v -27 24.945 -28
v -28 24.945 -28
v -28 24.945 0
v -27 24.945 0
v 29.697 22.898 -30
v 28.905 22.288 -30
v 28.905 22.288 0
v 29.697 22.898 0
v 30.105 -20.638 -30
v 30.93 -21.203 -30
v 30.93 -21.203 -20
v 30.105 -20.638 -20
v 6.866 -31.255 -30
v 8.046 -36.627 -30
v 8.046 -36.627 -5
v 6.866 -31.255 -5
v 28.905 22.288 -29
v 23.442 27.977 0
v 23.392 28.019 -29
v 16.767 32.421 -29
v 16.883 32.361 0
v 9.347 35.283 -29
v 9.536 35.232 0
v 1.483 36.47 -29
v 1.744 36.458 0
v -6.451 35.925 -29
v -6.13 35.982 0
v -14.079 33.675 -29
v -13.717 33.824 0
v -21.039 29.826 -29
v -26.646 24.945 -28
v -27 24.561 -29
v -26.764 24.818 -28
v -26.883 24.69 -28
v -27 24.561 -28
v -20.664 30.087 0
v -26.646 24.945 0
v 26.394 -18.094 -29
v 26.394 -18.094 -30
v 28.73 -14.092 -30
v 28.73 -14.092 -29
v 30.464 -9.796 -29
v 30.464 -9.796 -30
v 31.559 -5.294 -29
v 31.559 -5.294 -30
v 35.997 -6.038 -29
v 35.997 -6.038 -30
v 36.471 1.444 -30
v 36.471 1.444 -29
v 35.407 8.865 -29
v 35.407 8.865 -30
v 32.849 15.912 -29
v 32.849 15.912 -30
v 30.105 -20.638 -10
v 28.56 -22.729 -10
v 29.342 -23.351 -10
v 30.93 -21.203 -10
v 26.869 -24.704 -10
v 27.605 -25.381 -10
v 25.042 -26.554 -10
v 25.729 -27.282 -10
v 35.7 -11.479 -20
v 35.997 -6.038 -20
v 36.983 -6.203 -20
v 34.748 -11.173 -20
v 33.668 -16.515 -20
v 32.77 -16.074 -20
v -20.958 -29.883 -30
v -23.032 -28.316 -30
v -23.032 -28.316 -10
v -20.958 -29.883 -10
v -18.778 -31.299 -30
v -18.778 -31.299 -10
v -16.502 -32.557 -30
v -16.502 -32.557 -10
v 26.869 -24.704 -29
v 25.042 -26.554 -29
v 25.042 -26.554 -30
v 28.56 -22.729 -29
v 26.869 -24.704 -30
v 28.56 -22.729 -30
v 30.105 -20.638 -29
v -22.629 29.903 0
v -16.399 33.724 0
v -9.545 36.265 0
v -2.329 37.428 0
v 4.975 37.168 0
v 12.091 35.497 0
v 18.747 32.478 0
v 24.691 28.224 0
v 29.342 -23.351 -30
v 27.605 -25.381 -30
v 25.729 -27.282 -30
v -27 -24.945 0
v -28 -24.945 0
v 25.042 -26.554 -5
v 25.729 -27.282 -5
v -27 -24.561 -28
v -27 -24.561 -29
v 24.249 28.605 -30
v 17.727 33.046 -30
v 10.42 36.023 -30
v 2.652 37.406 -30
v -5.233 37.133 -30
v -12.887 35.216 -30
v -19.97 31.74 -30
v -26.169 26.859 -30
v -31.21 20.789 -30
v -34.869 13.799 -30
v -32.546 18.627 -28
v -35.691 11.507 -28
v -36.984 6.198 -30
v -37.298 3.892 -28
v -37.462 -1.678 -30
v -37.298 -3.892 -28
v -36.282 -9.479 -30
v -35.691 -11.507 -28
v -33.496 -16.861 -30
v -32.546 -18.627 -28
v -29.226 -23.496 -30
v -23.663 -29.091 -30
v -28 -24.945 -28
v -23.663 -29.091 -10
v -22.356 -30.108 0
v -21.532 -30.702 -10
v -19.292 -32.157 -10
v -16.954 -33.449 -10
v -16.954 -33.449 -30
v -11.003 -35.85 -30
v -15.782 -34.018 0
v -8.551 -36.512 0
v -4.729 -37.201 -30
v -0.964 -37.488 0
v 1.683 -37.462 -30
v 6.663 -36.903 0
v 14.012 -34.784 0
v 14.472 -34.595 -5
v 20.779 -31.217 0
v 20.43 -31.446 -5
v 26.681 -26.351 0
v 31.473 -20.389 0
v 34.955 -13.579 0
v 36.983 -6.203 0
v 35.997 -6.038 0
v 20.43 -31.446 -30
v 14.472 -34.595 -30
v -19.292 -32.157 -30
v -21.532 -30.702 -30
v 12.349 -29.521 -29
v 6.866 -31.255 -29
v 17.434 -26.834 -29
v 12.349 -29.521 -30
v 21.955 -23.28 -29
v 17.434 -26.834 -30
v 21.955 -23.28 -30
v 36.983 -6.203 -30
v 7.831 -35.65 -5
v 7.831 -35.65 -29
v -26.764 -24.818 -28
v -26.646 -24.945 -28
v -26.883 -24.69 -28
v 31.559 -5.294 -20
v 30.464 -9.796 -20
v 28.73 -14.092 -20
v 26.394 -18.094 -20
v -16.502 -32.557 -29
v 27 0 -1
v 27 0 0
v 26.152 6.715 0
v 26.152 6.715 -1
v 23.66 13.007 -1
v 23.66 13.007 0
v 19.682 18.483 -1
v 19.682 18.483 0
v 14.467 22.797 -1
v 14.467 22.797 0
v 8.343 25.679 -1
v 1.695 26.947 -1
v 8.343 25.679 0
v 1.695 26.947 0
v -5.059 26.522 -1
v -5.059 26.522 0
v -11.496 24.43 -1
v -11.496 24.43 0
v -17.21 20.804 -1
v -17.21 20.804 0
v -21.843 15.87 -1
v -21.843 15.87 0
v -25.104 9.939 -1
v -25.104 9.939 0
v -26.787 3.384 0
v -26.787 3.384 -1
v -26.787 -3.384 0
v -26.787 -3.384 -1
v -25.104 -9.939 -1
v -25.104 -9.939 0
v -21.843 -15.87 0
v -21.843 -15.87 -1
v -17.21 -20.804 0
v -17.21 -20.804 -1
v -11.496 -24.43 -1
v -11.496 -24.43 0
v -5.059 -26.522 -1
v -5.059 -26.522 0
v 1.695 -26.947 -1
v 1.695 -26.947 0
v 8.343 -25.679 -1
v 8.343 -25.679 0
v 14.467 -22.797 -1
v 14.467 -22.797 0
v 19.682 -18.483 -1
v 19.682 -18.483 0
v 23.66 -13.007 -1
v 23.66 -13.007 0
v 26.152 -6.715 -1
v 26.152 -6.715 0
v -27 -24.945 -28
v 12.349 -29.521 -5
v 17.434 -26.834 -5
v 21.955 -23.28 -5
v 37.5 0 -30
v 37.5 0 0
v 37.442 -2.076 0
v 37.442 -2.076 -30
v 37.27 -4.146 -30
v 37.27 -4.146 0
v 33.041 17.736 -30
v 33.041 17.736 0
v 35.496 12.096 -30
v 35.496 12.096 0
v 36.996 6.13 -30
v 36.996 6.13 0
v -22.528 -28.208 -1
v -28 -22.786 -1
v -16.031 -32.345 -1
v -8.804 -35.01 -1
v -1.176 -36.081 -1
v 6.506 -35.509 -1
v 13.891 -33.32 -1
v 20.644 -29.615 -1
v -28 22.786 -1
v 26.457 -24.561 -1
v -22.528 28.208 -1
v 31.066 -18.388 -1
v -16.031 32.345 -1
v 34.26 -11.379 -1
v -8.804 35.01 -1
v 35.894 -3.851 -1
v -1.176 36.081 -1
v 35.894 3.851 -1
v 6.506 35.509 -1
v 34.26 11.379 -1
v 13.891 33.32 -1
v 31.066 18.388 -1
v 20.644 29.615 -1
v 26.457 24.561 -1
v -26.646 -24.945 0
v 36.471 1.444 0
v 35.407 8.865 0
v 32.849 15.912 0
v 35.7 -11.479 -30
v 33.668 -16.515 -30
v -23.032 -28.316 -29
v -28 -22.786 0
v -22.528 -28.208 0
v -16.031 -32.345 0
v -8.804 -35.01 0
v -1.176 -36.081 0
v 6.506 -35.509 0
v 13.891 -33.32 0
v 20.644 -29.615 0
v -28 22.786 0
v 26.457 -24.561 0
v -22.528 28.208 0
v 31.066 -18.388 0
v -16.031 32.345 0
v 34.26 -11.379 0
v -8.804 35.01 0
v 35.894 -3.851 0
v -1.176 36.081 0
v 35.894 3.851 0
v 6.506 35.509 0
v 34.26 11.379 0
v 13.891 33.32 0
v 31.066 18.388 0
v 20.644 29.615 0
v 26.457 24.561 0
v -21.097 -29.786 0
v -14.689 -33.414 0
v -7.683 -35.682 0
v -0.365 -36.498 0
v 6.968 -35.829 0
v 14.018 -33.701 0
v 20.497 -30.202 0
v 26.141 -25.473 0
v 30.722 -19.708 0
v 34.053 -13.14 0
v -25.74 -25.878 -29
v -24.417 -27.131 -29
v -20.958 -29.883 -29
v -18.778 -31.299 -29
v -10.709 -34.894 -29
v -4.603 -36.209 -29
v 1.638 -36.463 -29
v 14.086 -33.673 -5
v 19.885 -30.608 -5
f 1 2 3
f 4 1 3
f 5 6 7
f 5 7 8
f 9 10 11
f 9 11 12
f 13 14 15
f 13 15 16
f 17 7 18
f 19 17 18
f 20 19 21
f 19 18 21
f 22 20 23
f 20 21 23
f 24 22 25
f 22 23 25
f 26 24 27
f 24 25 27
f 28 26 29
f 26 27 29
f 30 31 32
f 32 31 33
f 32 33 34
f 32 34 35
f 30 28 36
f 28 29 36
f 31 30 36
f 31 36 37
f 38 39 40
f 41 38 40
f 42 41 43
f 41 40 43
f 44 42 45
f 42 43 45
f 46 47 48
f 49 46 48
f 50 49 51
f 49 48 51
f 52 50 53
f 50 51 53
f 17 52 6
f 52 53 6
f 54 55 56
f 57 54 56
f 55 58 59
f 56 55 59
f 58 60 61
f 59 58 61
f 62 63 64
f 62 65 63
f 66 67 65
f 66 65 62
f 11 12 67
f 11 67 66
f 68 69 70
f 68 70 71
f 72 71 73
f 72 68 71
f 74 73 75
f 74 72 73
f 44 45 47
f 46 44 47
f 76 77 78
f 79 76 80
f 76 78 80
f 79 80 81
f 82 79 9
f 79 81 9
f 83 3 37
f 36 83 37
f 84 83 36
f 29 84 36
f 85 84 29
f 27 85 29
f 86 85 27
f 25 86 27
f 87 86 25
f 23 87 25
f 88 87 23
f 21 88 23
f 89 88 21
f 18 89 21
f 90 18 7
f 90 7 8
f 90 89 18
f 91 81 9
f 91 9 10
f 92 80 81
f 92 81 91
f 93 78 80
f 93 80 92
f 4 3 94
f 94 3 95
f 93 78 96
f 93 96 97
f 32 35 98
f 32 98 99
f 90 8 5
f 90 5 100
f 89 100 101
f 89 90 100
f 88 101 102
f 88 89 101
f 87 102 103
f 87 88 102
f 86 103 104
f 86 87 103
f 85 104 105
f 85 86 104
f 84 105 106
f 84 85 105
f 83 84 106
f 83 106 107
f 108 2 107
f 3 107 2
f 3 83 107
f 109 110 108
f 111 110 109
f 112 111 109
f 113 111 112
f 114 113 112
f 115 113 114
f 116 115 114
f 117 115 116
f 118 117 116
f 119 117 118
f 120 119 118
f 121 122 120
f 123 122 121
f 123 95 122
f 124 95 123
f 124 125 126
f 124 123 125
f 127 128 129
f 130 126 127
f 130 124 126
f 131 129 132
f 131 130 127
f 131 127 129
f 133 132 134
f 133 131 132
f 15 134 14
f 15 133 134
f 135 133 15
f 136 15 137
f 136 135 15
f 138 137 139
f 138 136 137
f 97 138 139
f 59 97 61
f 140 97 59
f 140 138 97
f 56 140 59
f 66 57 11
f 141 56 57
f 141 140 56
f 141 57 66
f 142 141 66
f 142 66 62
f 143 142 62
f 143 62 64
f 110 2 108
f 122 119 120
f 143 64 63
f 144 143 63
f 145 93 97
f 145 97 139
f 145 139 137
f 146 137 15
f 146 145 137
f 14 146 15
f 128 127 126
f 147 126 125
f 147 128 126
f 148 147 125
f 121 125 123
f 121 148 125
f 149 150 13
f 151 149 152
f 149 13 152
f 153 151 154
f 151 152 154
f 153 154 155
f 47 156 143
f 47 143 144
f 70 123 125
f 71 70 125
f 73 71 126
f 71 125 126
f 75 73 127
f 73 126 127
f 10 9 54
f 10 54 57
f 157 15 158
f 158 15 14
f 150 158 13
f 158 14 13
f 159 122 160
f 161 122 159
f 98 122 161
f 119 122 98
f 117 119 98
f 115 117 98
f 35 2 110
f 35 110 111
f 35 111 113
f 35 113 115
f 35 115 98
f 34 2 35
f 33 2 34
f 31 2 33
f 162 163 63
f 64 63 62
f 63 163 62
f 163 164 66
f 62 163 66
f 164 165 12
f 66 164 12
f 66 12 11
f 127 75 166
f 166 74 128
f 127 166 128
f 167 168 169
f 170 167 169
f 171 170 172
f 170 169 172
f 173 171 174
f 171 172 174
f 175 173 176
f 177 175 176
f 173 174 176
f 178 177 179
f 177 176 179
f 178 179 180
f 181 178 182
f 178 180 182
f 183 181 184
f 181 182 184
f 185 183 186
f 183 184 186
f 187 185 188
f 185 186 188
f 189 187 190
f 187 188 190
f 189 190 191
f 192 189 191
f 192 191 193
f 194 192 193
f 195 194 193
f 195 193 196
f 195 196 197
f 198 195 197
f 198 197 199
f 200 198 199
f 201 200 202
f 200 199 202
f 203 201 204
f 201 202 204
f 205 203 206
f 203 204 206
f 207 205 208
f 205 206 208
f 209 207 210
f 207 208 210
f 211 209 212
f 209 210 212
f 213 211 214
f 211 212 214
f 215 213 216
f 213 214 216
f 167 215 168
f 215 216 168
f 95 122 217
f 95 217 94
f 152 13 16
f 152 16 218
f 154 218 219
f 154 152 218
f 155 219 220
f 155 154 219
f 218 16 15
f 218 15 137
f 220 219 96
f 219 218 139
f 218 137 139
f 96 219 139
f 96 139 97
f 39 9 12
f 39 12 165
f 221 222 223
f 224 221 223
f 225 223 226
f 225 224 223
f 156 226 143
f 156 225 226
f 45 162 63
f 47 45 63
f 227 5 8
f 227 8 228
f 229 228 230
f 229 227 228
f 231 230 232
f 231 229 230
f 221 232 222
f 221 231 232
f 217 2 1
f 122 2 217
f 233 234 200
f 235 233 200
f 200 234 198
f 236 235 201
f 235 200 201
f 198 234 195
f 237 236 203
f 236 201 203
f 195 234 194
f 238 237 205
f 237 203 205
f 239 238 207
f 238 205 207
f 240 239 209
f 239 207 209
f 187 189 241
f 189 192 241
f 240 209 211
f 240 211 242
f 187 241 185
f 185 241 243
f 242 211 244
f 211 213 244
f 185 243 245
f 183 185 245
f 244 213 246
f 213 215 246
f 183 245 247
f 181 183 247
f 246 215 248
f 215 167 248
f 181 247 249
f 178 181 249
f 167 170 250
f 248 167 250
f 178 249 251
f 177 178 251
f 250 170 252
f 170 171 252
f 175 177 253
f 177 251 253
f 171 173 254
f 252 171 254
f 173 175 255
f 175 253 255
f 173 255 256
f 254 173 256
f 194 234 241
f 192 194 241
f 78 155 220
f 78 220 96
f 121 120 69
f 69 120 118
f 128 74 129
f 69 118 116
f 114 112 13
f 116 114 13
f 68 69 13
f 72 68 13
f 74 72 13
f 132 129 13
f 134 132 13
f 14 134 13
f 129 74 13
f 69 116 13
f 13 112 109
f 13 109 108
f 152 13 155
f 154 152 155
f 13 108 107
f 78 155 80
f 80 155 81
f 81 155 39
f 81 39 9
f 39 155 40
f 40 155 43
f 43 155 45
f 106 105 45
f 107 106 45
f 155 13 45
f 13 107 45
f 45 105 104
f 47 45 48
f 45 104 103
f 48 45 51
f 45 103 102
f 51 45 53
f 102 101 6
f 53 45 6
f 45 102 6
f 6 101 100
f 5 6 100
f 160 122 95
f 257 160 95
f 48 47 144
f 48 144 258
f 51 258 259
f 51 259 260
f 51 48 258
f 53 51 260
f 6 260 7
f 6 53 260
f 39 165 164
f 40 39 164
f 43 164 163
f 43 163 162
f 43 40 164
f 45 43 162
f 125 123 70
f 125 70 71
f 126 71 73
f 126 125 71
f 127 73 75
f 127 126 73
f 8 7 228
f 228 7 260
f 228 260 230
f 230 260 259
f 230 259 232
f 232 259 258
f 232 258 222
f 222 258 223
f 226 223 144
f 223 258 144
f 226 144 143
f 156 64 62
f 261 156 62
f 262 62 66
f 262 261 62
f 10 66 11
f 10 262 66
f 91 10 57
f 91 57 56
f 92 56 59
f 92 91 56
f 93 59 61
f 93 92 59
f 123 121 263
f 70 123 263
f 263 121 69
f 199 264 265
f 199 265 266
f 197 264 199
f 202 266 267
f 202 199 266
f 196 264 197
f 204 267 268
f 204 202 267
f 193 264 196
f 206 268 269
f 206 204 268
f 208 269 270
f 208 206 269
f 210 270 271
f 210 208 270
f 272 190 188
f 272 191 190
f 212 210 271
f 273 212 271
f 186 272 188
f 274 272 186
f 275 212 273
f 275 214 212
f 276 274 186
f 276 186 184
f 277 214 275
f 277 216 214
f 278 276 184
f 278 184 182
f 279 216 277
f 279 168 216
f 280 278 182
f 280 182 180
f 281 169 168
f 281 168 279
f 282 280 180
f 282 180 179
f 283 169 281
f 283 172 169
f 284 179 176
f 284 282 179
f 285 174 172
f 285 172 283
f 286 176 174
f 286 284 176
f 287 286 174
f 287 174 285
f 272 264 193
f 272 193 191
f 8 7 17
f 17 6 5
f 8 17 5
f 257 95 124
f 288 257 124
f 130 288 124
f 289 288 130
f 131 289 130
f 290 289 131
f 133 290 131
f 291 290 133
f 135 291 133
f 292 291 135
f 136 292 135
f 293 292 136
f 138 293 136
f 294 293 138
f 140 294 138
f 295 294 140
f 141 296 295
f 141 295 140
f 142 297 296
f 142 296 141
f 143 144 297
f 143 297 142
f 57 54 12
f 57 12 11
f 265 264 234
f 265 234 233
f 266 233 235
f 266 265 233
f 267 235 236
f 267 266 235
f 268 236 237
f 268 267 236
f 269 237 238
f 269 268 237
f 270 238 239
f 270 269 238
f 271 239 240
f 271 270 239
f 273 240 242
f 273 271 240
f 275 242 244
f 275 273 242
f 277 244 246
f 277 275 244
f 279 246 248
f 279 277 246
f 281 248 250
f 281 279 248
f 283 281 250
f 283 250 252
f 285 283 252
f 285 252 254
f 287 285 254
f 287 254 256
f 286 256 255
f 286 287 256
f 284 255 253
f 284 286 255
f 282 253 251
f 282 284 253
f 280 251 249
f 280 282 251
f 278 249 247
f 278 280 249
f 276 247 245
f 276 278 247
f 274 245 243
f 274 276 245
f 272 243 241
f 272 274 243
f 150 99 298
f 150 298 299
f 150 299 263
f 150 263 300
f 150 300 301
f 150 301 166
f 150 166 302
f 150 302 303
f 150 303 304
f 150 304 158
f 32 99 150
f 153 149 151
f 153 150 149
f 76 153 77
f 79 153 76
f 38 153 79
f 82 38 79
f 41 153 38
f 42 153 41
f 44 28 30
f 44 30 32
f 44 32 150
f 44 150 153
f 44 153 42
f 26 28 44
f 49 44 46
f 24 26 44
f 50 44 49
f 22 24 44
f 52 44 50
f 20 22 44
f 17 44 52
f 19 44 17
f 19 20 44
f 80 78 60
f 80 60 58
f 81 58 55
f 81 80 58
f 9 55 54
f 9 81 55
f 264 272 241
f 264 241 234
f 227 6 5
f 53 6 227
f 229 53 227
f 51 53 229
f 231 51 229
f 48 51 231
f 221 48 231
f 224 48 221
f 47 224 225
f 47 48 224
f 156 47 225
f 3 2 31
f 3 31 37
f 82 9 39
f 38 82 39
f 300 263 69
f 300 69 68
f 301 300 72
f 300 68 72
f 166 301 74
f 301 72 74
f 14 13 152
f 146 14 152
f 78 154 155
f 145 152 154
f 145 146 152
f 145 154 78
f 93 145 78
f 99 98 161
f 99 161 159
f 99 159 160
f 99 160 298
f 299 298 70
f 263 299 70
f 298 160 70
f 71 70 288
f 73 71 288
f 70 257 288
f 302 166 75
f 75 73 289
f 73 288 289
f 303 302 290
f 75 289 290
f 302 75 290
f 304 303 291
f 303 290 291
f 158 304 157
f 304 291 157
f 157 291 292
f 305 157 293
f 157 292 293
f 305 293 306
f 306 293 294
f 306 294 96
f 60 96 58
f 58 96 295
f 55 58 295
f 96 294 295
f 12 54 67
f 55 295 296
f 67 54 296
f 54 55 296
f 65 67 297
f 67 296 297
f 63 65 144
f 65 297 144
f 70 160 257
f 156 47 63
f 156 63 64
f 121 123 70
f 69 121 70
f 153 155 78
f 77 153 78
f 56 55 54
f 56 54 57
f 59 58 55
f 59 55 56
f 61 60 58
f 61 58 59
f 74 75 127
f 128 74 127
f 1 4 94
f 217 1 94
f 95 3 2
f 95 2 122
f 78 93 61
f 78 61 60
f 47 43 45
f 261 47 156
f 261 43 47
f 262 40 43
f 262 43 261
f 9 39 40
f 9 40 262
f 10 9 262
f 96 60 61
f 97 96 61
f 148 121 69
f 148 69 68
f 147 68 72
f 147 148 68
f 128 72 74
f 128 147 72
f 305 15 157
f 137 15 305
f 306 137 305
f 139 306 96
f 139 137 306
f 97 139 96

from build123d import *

# Parameters (mm, degrees)
F0_R        = 37.5
F1_DEPTH    = 30
F3_DEPTH    = 28
F8_T        = 1
F8_T3_DEPTH = 51.8898787331
F9_DEPTH    = 20
F10_DEPTH   = 20
F11_DEPTH   = 25
F12_DEPTH   = 25
F13_DEPTH   = 10
F14_DEPTH   = 10
F15_DEPTH   = 30
F16_DEPTH   = 30
F17_DEPTH   = 20
F18_DEPTH   = 20
F19_W       = 49.8898787331
F19_H       = 28
F20_DEPTH   = 1.3551748111
F21_DEPTH   = 1
F4_R        = 27
F22_DEPTH   = 1


# Not quite as in the source:
# - a shell that OpenCascade refuses in one call is made with other operations: the cavity is built on its own and cut out


with BuildPart() as f1:
    # F0 (on Top) → F1 (new body)
    with BuildSketch(Plane.XY):
        Circle(F0_R)
    extrude(amount=-F1_DEPTH)

    # F2 (on face) → F3 (cut)
    with BuildSketch(Plane.XY):
        with BuildLine():
            Line((-28, -24.9449393665), (-28, 24.9449393665))
            ThreePointArc((-28, 24.9449393665), (-37.5, 0), (-28, -24.9449393665))
        make_face()
    extrude(amount=-F3_DEPTH, mode=Mode.SUBTRACT)

    # F8: shell of thickness 1, made by hand


with BuildPart() as f8_core1:
    # F8_t2: copy of F1
    add(f1.part)

    # the walls: a layer under each face that stays
    f8_faces = [f8_core1.faces().sort_by_distance(p)[0] for p in [
        (18.75, 32.4759526419, -25),
        (-28, 0, -14),
        (-32.75, 0, -28),
        (0, 0, -30),
    ]]
    thicken(f8_faces, amount=-F8_T, mode=Mode.SUBTRACT)

    # F8_s4 → F8_t3 (cut)
    with BuildSketch(Plane.XZ.offset(-25.9449393665)):
        Polygon((-28.01, -27.99), (-27, -28), (-27, -29), (-28, -29), align=None)
    extrude(amount=F8_T3_DEPTH, mode=Mode.SUBTRACT)


with BuildPart() as f1_1:
    add(f1.part)

    # what is left inside the walls is the cavity
    f8_cavity = [f8_core1.part.solids().sort_by_distance(p)[0] for p in [
        (36.49, 0, -19.333333),
    ]]
    add(f8_cavity, mode=Mode.SUBTRACT)

    # F6 (on face) → F9 (cut)
    with BuildSketch(Plane(origin=(0, 0, -30), x_dir=(1, 0, 0), z_dir=(0, 0, -1))):
        with BuildLine():
            ThreePointArc((-16.953998922, 33.4486460197), (-20.4251291644, 31.4493894793), (-23.6632020109, 29.0912851313))
            Line((-23.6632020109, 29.0912851313), (-23.0321832906, 28.3155175278))
            ThreePointArc((-23.0321832906, 28.3155175278), (-19.8804590533, 30.6107390931), (-16.501892284, 32.5566821259))
            Line((-16.501892284, 32.5566821259), (-16.953998922, 33.4486460197))
        make_face()
    extrude(amount=-F9_DEPTH, mode=Mode.SUBTRACT)

    # F7 (on face) → F11 (cut)
    with BuildSketch(Plane(origin=(0, 0, -30), x_dir=(1, 0, 0), z_dir=(0, 0, -1))):
        with BuildLine():
            ThreePointArc((25.7285399775, 27.2817197153), (17.5217539189, 33.1547604365), (8.046001078, 36.6266551387))
            Line((8.046001078, 36.6266551387), (6.8659209199, 31.2547457184))
            ThreePointArc((6.8659209199, 31.2547457184), (14.9518966775, 28.2920622392), (21.9550207808, 23.2804008237))
            Line((21.9550207808, 23.2804008237), (25.0424455781, 26.5542071896))
            Line((25.0424455781, 26.5542071896), (25.7285399775, 27.2817197153))
        make_face()
    extrude(amount=-F11_DEPTH, mode=Mode.SUBTRACT)

    # F7 (on face) → F13 (cut)
    with BuildSketch(Plane(origin=(0, 0, -30), x_dir=(1, 0, 0), z_dir=(0, 0, -1))):
        with BuildLine():
            ThreePointArc((36.9833338658, 6.2034680763), (34.7750507424, 14.0337395539), (30.9299683404, 21.2034680763))
            Line((30.9299683404, 21.2034680763), (30.1051691846, 20.638042261))
            Line((30.1051691846, 20.638042261), (26.3935729838, 18.0936260918))
            ThreePointArc((26.3935729838, 18.0936260918), (29.6747099668, 11.9754577526), (31.5591115654, 5.2936260918))
            Line((31.5591115654, 5.2936260918), (35.9971116293, 6.038042261))
            Line((35.9971116293, 6.038042261), (36.9833338658, 6.2034680763))
        make_face()
    extrude(amount=-F13_DEPTH, mode=Mode.SUBTRACT)

    # F7 (on face) → F15 (cut)
    with BuildSketch(Plane(origin=(0, 0, -30), x_dir=(1, 0, 0), z_dir=(0, 0, -1))):
        with BuildLine():
            Line((28.9052016216, -22.2876494771), (29.6971249537, -22.8982700107))
            ThreePointArc((29.6971249537, -22.8982700107), (35.49571936, -12.0956152021), (37.5, 0))
            ThreePointArc((37.5, 0), (37.3706102437, 3.1124732958), (36.9833338658, 6.2034680763))
            Line((36.9833338658, 6.2034680763), (35.9971116293, 6.038042261))
            ThreePointArc((35.9971116293, 6.038042261), (35.4071146726, -8.8648875097), (28.9052016216, -22.2876494771))
        make_face()
    extrude(amount=-F15_DEPTH, mode=Mode.SUBTRACT)

    # F7 (on face) → F17 (cut)
    with BuildSketch(Plane(origin=(0, 0, -30), x_dir=(1, 0, 0), z_dir=(0, 0, -1))):
        with BuildLine():
            ThreePointArc((30.9299683404, 21.2034680763), (28.4918045576, 24.3816954507), (25.7285399775, 27.2817197153))
            Line((25.7285399775, 27.2817197153), (25.0424455781, 26.5542071896))
            ThreePointArc((25.0424455781, 26.5542071896), (27.7320231027, 23.7315169054), (30.1051691846, 20.638042261))
            Line((30.1051691846, 20.638042261), (30.9299683404, 21.2034680763))
        make_face()
    extrude(amount=-F17_DEPTH, mode=Mode.SUBTRACT)

    # F19 (on face) → F20 (cut, through all)
    with BuildSketch(Plane(origin=(-28, 0, 0), x_dir=(0, -1, 0), z_dir=(-1, 0, 0))):
        with Locations((0, -14)):
            Rectangle(F19_W, F19_H)
    extrude(amount=-F20_DEPTH, mode=Mode.SUBTRACT)


with BuildPart() as f10:
    # F6 (on face) → F10 (new body)
    with BuildSketch(Plane(origin=(0, 0, -30), x_dir=(1, 0, 0), z_dir=(0, 0, -1))):
        with BuildLine():
            ThreePointArc((-16.953998922, 33.4486460197), (-20.4251291644, 31.4493894793), (-23.6632020109, 29.0912851313))
            Line((-23.6632020109, 29.0912851313), (-23.0321832906, 28.3155175278))
            ThreePointArc((-23.0321832906, 28.3155175278), (-19.8804590533, 30.6107390931), (-16.501892284, 32.5566821259))
            Line((-16.501892284, 32.5566821259), (-16.953998922, 33.4486460197))
        make_face()
    extrude(amount=-F10_DEPTH)


with BuildPart() as f12:
    # F7 (on face) → F12 (new body)
    with BuildSketch(Plane(origin=(0, 0, -30), x_dir=(1, 0, 0), z_dir=(0, 0, -1))):
        with BuildLine():
            ThreePointArc((25.7285399775, 27.2817197153), (17.5217539189, 33.1547604365), (8.046001078, 36.6266551387))
            Line((8.046001078, 36.6266551387), (6.8659209199, 31.2547457184))
            ThreePointArc((6.8659209199, 31.2547457184), (14.9518966775, 28.2920622392), (21.9550207808, 23.2804008237))
            Line((21.9550207808, 23.2804008237), (25.0424455781, 26.5542071896))
            Line((25.0424455781, 26.5542071896), (25.7285399775, 27.2817197153))
        make_face()
    extrude(amount=-F12_DEPTH)


with BuildPart() as f14:
    # F7 (on face) → F14 (new body)
    with BuildSketch(Plane(origin=(0, 0, -30), x_dir=(1, 0, 0), z_dir=(0, 0, -1))):
        with BuildLine():
            ThreePointArc((36.9833338658, 6.2034680763), (34.7750507424, 14.0337395539), (30.9299683404, 21.2034680763))
            Line((30.9299683404, 21.2034680763), (30.1051691846, 20.638042261))
            Line((30.1051691846, 20.638042261), (26.3935729838, 18.0936260918))
            ThreePointArc((26.3935729838, 18.0936260918), (29.6747099668, 11.9754577526), (31.5591115654, 5.2936260918))
            Line((31.5591115654, 5.2936260918), (35.9971116293, 6.038042261))
            Line((35.9971116293, 6.038042261), (36.9833338658, 6.2034680763))
        make_face()
    extrude(amount=-F14_DEPTH)


with BuildPart() as f16:
    # F7 (on face) → F16 (new body)
    with BuildSketch(Plane(origin=(0, 0, -30), x_dir=(1, 0, 0), z_dir=(0, 0, -1))):
        with BuildLine():
            Line((28.9052016216, -22.2876494771), (29.6971249537, -22.8982700107))
            ThreePointArc((29.6971249537, -22.8982700107), (35.49571936, -12.0956152021), (37.5, 0))
            ThreePointArc((37.5, 0), (37.3706102437, 3.1124732958), (36.9833338658, 6.2034680763))
            Line((36.9833338658, 6.2034680763), (35.9971116293, 6.038042261))
            ThreePointArc((35.9971116293, 6.038042261), (35.4071146726, -8.8648875097), (28.9052016216, -22.2876494771))
        make_face()
    extrude(amount=-F16_DEPTH)


with BuildPart() as f18:
    # F7 (on face) → F18 (new body)
    with BuildSketch(Plane(origin=(0, 0, -30), x_dir=(1, 0, 0), z_dir=(0, 0, -1))):
        with BuildLine():
            ThreePointArc((30.9299683404, 21.2034680763), (28.4918045576, 24.3816954507), (25.7285399775, 27.2817197153))
            Line((25.7285399775, 27.2817197153), (25.0424455781, 26.5542071896))
            ThreePointArc((25.0424455781, 26.5542071896), (27.7320231027, 23.7315169054), (30.1051691846, 20.638042261))
            Line((30.1051691846, 20.638042261), (30.9299683404, 21.2034680763))
        make_face()
    extrude(amount=-F18_DEPTH)


with BuildPart() as f21:
    # F19 (on face) → F21 (new body)
    with BuildSketch(Plane(origin=(-28, 0, 0), x_dir=(0, -1, 0), z_dir=(-1, 0, 0))):
        with Locations((0, -14)):
            Rectangle(F19_W, F19_H)
    extrude(amount=-F21_DEPTH)


with BuildPart() as f22:
    # F4 (on face) → F22 (new body)
    with BuildSketch(Plane.XY):
        with BuildLine():
            ThreePointArc((-28, -22.7861800221), (36.1, 0), (-28, 22.7861800221))
            Line((-28, 22.7861800221), (-28, -22.7861800221))
        make_face()
        Circle(F4_R, mode=Mode.SUBTRACT)
    extrude(amount=-F22_DEPTH)


solid = Compound([f1_1.part, f10.part, f12.part, f14.part, f16.part, f18.part, f21.part, f22.part])
